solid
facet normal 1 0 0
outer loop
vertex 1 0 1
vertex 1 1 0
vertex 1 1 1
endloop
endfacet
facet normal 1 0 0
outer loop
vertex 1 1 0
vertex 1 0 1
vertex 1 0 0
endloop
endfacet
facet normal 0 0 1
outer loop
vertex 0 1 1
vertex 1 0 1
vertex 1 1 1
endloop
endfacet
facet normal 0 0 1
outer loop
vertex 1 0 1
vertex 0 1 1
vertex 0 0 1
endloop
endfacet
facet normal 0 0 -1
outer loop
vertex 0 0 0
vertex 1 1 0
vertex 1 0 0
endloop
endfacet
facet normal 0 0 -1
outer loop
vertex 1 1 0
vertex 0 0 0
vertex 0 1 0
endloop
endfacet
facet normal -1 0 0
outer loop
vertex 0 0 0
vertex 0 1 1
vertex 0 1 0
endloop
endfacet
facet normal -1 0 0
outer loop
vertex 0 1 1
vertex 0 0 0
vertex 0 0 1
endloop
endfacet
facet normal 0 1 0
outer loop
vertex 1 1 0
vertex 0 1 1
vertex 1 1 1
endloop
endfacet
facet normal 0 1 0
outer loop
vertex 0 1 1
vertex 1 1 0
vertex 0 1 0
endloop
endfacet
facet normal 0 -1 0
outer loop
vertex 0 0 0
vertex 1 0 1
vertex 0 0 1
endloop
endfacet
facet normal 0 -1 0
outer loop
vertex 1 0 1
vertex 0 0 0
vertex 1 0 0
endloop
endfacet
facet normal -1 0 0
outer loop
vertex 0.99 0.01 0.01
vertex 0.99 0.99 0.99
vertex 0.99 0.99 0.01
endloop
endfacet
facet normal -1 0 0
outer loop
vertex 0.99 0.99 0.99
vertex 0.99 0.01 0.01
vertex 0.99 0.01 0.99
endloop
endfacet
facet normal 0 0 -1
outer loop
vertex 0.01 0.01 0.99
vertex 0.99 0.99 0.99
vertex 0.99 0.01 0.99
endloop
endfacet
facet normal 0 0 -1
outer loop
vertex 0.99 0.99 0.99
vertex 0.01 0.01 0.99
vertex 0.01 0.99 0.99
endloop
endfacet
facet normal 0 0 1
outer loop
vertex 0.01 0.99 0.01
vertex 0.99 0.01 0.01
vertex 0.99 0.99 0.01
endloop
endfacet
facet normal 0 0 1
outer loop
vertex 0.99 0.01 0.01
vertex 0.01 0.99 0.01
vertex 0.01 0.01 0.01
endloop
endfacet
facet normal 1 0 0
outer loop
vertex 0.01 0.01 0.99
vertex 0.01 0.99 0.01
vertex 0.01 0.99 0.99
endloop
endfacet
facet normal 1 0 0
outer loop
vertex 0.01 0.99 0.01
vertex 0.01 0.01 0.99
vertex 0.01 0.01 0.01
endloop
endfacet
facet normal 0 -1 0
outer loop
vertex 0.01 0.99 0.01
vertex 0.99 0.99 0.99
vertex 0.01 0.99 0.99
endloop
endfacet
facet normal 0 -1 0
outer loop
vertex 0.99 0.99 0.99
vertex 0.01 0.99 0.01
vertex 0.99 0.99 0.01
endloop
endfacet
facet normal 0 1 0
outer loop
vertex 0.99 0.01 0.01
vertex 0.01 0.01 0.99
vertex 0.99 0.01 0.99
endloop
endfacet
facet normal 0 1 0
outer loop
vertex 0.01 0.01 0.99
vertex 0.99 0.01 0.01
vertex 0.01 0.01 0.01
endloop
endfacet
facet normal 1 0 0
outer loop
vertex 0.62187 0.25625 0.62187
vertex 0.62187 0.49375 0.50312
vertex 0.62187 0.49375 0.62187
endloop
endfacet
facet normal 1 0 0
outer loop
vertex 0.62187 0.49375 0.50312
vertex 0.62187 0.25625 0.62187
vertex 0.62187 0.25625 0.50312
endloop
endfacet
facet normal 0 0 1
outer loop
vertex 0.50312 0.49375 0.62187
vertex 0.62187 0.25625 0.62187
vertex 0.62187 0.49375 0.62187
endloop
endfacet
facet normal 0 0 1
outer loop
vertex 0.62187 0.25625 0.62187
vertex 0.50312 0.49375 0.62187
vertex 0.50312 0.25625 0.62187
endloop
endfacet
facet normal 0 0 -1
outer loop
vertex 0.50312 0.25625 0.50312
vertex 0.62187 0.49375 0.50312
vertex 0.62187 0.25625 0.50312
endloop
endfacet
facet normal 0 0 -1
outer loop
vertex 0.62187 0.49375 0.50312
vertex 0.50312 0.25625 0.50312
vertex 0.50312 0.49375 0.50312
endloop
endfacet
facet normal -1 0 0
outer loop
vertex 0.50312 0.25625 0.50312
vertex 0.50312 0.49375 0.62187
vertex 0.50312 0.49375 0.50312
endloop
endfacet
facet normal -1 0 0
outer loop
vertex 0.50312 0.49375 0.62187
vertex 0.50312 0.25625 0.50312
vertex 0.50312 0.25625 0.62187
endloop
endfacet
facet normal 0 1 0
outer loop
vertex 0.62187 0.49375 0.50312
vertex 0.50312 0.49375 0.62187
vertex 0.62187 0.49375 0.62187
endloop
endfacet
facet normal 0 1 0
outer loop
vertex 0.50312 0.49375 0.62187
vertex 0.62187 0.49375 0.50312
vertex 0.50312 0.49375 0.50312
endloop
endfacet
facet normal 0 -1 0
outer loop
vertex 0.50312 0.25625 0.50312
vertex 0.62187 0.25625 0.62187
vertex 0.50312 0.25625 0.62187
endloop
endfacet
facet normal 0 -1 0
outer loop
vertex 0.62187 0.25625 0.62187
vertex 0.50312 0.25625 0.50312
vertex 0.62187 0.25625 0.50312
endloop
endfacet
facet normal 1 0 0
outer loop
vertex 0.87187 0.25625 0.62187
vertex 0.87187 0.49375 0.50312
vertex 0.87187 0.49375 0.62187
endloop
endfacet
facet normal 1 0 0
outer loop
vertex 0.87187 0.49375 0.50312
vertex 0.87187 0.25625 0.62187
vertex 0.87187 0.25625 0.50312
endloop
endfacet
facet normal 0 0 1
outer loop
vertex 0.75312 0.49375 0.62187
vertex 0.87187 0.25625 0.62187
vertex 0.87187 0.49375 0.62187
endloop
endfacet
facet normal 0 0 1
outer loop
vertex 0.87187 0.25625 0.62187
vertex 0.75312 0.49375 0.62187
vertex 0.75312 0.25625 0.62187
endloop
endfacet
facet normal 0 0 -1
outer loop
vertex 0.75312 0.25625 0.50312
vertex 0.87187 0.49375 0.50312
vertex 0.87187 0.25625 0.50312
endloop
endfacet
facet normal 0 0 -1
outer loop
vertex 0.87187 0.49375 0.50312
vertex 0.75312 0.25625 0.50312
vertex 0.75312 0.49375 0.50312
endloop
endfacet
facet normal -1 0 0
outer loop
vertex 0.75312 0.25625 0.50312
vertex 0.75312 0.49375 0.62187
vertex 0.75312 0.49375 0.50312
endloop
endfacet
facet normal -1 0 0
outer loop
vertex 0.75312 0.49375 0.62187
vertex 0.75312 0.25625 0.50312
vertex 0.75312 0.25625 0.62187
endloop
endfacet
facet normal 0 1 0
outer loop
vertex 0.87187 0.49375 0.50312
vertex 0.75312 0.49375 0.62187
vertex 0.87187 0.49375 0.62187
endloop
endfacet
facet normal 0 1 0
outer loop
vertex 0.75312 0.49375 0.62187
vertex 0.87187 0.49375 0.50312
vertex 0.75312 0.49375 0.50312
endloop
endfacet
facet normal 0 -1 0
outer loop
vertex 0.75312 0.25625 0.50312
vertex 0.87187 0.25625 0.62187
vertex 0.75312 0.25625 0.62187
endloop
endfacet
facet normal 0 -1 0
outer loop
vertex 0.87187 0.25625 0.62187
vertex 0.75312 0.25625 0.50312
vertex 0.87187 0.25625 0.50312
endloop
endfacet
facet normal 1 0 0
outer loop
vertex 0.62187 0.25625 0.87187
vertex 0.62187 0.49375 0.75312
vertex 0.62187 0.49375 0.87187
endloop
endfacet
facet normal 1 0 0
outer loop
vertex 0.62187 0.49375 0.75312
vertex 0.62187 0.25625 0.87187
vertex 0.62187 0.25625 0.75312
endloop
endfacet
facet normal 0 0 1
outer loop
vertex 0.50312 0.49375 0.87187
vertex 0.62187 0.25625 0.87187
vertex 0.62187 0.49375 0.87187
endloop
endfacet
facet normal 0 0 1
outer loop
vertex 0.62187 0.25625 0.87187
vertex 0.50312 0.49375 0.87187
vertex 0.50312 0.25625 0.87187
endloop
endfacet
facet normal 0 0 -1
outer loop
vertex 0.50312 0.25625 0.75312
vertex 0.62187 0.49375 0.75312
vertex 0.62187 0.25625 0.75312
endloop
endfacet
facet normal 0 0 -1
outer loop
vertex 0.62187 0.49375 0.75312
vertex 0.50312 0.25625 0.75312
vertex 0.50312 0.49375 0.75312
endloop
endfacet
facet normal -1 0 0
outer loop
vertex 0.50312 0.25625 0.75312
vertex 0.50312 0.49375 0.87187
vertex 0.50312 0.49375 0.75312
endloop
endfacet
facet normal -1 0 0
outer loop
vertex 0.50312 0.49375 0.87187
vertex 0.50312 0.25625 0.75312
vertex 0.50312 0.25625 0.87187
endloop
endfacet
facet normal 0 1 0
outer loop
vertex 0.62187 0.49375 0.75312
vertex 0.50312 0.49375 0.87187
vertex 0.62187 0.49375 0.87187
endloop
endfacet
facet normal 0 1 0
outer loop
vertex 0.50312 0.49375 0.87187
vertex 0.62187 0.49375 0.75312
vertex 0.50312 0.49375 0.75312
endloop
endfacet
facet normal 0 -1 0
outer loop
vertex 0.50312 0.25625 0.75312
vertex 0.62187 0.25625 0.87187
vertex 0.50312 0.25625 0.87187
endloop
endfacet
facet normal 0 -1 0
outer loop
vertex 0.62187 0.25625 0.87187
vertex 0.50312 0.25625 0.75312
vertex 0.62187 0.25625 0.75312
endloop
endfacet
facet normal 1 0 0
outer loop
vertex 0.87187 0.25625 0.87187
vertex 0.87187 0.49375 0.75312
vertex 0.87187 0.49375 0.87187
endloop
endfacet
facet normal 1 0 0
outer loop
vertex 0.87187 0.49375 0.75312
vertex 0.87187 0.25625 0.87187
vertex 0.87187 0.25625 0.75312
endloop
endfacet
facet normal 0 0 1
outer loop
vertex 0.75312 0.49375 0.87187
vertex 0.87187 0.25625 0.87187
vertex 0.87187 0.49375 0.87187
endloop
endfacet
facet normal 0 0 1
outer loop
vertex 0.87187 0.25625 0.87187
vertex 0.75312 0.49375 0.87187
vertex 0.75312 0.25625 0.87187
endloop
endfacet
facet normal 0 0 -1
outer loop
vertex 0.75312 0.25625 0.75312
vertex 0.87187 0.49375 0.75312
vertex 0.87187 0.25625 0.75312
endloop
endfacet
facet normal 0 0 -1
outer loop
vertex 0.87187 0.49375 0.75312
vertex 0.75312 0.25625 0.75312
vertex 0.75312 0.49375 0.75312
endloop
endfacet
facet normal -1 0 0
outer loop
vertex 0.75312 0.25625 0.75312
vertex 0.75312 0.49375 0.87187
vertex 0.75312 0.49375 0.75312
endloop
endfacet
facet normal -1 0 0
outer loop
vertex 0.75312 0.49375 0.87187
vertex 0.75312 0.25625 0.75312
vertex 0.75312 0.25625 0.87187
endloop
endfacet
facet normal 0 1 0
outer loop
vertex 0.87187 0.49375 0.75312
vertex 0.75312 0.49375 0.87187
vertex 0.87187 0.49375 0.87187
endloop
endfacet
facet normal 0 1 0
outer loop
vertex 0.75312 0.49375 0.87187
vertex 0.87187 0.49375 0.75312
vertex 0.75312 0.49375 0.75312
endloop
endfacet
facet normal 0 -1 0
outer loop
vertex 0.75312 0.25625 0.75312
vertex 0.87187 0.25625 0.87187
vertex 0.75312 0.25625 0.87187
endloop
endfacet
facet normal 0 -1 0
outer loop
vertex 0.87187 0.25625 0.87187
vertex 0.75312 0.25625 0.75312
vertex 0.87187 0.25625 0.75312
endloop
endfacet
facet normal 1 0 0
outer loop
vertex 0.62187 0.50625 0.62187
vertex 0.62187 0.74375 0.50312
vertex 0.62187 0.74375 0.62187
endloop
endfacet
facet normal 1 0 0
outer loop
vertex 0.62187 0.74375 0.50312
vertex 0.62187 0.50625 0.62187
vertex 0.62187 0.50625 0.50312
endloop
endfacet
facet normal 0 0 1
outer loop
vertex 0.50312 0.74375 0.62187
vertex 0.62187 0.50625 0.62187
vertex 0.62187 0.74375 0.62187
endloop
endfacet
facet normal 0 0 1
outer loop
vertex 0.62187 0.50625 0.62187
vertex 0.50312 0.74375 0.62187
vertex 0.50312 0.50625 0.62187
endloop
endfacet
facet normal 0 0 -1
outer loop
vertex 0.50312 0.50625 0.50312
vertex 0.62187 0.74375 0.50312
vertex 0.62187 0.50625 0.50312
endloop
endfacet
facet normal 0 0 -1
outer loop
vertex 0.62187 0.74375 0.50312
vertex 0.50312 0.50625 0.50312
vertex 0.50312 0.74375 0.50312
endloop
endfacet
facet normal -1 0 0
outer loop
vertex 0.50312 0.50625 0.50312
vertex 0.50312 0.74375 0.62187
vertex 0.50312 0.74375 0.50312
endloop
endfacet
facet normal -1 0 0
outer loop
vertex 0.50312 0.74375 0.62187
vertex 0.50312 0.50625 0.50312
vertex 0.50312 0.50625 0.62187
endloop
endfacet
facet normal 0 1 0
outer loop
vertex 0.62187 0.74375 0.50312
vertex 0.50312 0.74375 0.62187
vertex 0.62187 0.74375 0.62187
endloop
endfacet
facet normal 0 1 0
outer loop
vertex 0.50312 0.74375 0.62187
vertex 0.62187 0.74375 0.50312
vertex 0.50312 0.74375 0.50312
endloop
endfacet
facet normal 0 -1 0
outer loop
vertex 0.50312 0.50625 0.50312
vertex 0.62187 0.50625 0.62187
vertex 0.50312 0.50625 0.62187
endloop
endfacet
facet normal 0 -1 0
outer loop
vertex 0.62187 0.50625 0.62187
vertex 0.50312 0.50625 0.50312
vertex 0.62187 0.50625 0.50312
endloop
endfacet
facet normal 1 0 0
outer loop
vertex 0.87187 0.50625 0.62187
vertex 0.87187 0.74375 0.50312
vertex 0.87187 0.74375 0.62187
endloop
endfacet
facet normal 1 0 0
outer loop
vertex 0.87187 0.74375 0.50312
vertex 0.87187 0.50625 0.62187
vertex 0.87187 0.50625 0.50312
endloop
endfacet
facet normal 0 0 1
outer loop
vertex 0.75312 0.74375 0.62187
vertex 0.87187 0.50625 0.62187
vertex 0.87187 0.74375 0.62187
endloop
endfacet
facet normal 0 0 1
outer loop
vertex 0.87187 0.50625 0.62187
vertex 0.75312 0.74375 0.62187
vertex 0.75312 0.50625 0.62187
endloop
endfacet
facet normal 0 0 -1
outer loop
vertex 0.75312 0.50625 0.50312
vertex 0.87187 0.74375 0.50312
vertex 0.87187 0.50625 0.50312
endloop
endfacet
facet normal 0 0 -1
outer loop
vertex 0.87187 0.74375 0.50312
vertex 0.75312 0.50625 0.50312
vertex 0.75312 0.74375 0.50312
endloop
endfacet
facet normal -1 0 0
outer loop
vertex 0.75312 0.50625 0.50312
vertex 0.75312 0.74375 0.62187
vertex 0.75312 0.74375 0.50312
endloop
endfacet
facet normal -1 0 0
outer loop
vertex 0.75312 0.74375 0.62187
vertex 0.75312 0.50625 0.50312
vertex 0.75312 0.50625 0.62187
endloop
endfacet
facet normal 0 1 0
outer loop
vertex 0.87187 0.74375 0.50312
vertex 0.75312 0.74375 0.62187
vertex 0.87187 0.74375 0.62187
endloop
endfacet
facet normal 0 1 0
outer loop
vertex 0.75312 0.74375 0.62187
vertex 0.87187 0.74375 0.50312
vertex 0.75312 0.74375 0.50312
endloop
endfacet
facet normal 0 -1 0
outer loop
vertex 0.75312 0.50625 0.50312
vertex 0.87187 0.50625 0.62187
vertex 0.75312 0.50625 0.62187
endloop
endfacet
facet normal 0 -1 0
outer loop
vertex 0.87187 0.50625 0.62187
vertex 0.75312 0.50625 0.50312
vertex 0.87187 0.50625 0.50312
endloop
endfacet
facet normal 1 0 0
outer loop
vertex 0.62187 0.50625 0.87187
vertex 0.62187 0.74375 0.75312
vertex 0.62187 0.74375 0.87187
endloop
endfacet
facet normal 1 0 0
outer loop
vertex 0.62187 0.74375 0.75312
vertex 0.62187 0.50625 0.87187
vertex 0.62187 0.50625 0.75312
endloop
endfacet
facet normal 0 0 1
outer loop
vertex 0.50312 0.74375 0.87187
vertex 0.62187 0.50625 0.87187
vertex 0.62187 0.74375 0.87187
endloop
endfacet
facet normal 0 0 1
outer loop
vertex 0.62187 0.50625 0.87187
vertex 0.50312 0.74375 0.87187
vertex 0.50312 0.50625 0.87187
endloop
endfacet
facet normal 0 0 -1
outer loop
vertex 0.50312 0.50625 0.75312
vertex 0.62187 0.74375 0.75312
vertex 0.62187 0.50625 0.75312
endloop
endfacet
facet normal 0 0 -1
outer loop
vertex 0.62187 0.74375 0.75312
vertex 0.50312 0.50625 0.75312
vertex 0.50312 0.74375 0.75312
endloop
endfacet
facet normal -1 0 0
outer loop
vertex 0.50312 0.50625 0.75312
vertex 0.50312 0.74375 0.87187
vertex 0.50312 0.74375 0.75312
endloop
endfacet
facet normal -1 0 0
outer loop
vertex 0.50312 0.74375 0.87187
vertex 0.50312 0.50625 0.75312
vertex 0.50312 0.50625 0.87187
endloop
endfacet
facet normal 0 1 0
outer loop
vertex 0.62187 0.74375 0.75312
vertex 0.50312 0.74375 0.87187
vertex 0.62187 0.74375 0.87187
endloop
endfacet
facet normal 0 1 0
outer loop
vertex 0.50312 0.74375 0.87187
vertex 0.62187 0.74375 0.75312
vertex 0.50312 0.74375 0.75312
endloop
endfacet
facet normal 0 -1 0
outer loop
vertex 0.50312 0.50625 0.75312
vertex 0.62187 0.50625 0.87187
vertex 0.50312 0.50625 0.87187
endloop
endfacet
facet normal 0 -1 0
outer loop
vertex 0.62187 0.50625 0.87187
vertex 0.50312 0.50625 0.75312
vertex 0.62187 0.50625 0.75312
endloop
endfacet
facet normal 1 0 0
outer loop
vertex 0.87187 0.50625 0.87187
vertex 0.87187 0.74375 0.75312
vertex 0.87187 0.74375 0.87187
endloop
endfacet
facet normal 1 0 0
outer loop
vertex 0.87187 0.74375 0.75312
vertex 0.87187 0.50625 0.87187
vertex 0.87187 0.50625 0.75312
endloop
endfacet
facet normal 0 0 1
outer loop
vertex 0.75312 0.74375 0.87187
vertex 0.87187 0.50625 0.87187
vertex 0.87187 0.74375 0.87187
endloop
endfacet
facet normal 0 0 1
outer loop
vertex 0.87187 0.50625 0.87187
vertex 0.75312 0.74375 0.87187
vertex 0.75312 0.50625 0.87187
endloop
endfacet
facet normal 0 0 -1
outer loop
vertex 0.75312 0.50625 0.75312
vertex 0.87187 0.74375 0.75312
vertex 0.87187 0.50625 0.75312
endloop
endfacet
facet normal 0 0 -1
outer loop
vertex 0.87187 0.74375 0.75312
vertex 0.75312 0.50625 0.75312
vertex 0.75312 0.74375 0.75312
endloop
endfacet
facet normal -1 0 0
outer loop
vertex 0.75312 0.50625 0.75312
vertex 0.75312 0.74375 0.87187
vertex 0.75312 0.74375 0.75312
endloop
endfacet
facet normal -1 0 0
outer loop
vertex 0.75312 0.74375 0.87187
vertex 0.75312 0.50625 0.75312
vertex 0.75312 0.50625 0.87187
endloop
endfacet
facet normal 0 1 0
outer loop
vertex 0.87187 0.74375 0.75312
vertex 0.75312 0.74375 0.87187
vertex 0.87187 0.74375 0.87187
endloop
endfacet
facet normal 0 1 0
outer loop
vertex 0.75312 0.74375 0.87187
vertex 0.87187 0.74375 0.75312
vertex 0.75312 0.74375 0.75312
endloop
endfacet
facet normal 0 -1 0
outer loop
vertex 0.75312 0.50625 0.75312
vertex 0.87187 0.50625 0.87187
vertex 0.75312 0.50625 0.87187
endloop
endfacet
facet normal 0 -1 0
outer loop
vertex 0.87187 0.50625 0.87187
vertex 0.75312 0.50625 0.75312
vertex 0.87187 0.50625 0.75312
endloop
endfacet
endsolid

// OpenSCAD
translate([0.5625, 0.375, 0.5625]) color([0.8740229692652243, 0.6541461711493592, 0.21289315855754942]) cube([0.11875, 0.2375, 0.11875], center=true);
translate([0.8125, 0.375, 0.5625]) color([0.9328418457966335, 0.42345059226773774, 0.5012376899041451]) cube([0.11875, 0.2375, 0.11875], center=true);
translate([0.5625, 0.375, 0.8125]) color([0.5811541702347708, 0.2791891573101454, 0.2092311813057095]) cube([0.11875, 0.2375, 0.11875], center=true);
translate([0.8125, 0.375, 0.8125]) color([0.9628933046967749, 0.6198760626942967, 0.5999578261672418]) cube([0.11875, 0.2375, 0.11875], center=true);
translate([0.5625, 0.625, 0.5625]) color([0.23874719597172656, 0.5159213977515871, 0.8042715508319355]) cube([0.11875, 0.2375, 0.11875], center=true);
translate([0.8125, 0.625, 0.5625]) color([0.6755197251802578, 0.41487488756696345, 0.5733633065217538]) cube([0.11875, 0.2375, 0.11875], center=true);
translate([0.5625, 0.625, 0.8125]) color([0.8352652083788017, 0.4789645616530247, 0.8888242662849705]) cube([0.11875, 0.2375, 0.11875], center=true);
translate([0.8125, 0.625, 0.8125]) color([0.7977003312522131, 0.4430245559395397, 0.5757872208285841]) cube([0.11875, 0.2375, 0.11875], center=true);
color([0.3,0.3,0.3,0.3]) difference() { cube([1,1,1]); translate([0.01,0.01,0.01]) cube([0.98,0.98,0.98]); }
